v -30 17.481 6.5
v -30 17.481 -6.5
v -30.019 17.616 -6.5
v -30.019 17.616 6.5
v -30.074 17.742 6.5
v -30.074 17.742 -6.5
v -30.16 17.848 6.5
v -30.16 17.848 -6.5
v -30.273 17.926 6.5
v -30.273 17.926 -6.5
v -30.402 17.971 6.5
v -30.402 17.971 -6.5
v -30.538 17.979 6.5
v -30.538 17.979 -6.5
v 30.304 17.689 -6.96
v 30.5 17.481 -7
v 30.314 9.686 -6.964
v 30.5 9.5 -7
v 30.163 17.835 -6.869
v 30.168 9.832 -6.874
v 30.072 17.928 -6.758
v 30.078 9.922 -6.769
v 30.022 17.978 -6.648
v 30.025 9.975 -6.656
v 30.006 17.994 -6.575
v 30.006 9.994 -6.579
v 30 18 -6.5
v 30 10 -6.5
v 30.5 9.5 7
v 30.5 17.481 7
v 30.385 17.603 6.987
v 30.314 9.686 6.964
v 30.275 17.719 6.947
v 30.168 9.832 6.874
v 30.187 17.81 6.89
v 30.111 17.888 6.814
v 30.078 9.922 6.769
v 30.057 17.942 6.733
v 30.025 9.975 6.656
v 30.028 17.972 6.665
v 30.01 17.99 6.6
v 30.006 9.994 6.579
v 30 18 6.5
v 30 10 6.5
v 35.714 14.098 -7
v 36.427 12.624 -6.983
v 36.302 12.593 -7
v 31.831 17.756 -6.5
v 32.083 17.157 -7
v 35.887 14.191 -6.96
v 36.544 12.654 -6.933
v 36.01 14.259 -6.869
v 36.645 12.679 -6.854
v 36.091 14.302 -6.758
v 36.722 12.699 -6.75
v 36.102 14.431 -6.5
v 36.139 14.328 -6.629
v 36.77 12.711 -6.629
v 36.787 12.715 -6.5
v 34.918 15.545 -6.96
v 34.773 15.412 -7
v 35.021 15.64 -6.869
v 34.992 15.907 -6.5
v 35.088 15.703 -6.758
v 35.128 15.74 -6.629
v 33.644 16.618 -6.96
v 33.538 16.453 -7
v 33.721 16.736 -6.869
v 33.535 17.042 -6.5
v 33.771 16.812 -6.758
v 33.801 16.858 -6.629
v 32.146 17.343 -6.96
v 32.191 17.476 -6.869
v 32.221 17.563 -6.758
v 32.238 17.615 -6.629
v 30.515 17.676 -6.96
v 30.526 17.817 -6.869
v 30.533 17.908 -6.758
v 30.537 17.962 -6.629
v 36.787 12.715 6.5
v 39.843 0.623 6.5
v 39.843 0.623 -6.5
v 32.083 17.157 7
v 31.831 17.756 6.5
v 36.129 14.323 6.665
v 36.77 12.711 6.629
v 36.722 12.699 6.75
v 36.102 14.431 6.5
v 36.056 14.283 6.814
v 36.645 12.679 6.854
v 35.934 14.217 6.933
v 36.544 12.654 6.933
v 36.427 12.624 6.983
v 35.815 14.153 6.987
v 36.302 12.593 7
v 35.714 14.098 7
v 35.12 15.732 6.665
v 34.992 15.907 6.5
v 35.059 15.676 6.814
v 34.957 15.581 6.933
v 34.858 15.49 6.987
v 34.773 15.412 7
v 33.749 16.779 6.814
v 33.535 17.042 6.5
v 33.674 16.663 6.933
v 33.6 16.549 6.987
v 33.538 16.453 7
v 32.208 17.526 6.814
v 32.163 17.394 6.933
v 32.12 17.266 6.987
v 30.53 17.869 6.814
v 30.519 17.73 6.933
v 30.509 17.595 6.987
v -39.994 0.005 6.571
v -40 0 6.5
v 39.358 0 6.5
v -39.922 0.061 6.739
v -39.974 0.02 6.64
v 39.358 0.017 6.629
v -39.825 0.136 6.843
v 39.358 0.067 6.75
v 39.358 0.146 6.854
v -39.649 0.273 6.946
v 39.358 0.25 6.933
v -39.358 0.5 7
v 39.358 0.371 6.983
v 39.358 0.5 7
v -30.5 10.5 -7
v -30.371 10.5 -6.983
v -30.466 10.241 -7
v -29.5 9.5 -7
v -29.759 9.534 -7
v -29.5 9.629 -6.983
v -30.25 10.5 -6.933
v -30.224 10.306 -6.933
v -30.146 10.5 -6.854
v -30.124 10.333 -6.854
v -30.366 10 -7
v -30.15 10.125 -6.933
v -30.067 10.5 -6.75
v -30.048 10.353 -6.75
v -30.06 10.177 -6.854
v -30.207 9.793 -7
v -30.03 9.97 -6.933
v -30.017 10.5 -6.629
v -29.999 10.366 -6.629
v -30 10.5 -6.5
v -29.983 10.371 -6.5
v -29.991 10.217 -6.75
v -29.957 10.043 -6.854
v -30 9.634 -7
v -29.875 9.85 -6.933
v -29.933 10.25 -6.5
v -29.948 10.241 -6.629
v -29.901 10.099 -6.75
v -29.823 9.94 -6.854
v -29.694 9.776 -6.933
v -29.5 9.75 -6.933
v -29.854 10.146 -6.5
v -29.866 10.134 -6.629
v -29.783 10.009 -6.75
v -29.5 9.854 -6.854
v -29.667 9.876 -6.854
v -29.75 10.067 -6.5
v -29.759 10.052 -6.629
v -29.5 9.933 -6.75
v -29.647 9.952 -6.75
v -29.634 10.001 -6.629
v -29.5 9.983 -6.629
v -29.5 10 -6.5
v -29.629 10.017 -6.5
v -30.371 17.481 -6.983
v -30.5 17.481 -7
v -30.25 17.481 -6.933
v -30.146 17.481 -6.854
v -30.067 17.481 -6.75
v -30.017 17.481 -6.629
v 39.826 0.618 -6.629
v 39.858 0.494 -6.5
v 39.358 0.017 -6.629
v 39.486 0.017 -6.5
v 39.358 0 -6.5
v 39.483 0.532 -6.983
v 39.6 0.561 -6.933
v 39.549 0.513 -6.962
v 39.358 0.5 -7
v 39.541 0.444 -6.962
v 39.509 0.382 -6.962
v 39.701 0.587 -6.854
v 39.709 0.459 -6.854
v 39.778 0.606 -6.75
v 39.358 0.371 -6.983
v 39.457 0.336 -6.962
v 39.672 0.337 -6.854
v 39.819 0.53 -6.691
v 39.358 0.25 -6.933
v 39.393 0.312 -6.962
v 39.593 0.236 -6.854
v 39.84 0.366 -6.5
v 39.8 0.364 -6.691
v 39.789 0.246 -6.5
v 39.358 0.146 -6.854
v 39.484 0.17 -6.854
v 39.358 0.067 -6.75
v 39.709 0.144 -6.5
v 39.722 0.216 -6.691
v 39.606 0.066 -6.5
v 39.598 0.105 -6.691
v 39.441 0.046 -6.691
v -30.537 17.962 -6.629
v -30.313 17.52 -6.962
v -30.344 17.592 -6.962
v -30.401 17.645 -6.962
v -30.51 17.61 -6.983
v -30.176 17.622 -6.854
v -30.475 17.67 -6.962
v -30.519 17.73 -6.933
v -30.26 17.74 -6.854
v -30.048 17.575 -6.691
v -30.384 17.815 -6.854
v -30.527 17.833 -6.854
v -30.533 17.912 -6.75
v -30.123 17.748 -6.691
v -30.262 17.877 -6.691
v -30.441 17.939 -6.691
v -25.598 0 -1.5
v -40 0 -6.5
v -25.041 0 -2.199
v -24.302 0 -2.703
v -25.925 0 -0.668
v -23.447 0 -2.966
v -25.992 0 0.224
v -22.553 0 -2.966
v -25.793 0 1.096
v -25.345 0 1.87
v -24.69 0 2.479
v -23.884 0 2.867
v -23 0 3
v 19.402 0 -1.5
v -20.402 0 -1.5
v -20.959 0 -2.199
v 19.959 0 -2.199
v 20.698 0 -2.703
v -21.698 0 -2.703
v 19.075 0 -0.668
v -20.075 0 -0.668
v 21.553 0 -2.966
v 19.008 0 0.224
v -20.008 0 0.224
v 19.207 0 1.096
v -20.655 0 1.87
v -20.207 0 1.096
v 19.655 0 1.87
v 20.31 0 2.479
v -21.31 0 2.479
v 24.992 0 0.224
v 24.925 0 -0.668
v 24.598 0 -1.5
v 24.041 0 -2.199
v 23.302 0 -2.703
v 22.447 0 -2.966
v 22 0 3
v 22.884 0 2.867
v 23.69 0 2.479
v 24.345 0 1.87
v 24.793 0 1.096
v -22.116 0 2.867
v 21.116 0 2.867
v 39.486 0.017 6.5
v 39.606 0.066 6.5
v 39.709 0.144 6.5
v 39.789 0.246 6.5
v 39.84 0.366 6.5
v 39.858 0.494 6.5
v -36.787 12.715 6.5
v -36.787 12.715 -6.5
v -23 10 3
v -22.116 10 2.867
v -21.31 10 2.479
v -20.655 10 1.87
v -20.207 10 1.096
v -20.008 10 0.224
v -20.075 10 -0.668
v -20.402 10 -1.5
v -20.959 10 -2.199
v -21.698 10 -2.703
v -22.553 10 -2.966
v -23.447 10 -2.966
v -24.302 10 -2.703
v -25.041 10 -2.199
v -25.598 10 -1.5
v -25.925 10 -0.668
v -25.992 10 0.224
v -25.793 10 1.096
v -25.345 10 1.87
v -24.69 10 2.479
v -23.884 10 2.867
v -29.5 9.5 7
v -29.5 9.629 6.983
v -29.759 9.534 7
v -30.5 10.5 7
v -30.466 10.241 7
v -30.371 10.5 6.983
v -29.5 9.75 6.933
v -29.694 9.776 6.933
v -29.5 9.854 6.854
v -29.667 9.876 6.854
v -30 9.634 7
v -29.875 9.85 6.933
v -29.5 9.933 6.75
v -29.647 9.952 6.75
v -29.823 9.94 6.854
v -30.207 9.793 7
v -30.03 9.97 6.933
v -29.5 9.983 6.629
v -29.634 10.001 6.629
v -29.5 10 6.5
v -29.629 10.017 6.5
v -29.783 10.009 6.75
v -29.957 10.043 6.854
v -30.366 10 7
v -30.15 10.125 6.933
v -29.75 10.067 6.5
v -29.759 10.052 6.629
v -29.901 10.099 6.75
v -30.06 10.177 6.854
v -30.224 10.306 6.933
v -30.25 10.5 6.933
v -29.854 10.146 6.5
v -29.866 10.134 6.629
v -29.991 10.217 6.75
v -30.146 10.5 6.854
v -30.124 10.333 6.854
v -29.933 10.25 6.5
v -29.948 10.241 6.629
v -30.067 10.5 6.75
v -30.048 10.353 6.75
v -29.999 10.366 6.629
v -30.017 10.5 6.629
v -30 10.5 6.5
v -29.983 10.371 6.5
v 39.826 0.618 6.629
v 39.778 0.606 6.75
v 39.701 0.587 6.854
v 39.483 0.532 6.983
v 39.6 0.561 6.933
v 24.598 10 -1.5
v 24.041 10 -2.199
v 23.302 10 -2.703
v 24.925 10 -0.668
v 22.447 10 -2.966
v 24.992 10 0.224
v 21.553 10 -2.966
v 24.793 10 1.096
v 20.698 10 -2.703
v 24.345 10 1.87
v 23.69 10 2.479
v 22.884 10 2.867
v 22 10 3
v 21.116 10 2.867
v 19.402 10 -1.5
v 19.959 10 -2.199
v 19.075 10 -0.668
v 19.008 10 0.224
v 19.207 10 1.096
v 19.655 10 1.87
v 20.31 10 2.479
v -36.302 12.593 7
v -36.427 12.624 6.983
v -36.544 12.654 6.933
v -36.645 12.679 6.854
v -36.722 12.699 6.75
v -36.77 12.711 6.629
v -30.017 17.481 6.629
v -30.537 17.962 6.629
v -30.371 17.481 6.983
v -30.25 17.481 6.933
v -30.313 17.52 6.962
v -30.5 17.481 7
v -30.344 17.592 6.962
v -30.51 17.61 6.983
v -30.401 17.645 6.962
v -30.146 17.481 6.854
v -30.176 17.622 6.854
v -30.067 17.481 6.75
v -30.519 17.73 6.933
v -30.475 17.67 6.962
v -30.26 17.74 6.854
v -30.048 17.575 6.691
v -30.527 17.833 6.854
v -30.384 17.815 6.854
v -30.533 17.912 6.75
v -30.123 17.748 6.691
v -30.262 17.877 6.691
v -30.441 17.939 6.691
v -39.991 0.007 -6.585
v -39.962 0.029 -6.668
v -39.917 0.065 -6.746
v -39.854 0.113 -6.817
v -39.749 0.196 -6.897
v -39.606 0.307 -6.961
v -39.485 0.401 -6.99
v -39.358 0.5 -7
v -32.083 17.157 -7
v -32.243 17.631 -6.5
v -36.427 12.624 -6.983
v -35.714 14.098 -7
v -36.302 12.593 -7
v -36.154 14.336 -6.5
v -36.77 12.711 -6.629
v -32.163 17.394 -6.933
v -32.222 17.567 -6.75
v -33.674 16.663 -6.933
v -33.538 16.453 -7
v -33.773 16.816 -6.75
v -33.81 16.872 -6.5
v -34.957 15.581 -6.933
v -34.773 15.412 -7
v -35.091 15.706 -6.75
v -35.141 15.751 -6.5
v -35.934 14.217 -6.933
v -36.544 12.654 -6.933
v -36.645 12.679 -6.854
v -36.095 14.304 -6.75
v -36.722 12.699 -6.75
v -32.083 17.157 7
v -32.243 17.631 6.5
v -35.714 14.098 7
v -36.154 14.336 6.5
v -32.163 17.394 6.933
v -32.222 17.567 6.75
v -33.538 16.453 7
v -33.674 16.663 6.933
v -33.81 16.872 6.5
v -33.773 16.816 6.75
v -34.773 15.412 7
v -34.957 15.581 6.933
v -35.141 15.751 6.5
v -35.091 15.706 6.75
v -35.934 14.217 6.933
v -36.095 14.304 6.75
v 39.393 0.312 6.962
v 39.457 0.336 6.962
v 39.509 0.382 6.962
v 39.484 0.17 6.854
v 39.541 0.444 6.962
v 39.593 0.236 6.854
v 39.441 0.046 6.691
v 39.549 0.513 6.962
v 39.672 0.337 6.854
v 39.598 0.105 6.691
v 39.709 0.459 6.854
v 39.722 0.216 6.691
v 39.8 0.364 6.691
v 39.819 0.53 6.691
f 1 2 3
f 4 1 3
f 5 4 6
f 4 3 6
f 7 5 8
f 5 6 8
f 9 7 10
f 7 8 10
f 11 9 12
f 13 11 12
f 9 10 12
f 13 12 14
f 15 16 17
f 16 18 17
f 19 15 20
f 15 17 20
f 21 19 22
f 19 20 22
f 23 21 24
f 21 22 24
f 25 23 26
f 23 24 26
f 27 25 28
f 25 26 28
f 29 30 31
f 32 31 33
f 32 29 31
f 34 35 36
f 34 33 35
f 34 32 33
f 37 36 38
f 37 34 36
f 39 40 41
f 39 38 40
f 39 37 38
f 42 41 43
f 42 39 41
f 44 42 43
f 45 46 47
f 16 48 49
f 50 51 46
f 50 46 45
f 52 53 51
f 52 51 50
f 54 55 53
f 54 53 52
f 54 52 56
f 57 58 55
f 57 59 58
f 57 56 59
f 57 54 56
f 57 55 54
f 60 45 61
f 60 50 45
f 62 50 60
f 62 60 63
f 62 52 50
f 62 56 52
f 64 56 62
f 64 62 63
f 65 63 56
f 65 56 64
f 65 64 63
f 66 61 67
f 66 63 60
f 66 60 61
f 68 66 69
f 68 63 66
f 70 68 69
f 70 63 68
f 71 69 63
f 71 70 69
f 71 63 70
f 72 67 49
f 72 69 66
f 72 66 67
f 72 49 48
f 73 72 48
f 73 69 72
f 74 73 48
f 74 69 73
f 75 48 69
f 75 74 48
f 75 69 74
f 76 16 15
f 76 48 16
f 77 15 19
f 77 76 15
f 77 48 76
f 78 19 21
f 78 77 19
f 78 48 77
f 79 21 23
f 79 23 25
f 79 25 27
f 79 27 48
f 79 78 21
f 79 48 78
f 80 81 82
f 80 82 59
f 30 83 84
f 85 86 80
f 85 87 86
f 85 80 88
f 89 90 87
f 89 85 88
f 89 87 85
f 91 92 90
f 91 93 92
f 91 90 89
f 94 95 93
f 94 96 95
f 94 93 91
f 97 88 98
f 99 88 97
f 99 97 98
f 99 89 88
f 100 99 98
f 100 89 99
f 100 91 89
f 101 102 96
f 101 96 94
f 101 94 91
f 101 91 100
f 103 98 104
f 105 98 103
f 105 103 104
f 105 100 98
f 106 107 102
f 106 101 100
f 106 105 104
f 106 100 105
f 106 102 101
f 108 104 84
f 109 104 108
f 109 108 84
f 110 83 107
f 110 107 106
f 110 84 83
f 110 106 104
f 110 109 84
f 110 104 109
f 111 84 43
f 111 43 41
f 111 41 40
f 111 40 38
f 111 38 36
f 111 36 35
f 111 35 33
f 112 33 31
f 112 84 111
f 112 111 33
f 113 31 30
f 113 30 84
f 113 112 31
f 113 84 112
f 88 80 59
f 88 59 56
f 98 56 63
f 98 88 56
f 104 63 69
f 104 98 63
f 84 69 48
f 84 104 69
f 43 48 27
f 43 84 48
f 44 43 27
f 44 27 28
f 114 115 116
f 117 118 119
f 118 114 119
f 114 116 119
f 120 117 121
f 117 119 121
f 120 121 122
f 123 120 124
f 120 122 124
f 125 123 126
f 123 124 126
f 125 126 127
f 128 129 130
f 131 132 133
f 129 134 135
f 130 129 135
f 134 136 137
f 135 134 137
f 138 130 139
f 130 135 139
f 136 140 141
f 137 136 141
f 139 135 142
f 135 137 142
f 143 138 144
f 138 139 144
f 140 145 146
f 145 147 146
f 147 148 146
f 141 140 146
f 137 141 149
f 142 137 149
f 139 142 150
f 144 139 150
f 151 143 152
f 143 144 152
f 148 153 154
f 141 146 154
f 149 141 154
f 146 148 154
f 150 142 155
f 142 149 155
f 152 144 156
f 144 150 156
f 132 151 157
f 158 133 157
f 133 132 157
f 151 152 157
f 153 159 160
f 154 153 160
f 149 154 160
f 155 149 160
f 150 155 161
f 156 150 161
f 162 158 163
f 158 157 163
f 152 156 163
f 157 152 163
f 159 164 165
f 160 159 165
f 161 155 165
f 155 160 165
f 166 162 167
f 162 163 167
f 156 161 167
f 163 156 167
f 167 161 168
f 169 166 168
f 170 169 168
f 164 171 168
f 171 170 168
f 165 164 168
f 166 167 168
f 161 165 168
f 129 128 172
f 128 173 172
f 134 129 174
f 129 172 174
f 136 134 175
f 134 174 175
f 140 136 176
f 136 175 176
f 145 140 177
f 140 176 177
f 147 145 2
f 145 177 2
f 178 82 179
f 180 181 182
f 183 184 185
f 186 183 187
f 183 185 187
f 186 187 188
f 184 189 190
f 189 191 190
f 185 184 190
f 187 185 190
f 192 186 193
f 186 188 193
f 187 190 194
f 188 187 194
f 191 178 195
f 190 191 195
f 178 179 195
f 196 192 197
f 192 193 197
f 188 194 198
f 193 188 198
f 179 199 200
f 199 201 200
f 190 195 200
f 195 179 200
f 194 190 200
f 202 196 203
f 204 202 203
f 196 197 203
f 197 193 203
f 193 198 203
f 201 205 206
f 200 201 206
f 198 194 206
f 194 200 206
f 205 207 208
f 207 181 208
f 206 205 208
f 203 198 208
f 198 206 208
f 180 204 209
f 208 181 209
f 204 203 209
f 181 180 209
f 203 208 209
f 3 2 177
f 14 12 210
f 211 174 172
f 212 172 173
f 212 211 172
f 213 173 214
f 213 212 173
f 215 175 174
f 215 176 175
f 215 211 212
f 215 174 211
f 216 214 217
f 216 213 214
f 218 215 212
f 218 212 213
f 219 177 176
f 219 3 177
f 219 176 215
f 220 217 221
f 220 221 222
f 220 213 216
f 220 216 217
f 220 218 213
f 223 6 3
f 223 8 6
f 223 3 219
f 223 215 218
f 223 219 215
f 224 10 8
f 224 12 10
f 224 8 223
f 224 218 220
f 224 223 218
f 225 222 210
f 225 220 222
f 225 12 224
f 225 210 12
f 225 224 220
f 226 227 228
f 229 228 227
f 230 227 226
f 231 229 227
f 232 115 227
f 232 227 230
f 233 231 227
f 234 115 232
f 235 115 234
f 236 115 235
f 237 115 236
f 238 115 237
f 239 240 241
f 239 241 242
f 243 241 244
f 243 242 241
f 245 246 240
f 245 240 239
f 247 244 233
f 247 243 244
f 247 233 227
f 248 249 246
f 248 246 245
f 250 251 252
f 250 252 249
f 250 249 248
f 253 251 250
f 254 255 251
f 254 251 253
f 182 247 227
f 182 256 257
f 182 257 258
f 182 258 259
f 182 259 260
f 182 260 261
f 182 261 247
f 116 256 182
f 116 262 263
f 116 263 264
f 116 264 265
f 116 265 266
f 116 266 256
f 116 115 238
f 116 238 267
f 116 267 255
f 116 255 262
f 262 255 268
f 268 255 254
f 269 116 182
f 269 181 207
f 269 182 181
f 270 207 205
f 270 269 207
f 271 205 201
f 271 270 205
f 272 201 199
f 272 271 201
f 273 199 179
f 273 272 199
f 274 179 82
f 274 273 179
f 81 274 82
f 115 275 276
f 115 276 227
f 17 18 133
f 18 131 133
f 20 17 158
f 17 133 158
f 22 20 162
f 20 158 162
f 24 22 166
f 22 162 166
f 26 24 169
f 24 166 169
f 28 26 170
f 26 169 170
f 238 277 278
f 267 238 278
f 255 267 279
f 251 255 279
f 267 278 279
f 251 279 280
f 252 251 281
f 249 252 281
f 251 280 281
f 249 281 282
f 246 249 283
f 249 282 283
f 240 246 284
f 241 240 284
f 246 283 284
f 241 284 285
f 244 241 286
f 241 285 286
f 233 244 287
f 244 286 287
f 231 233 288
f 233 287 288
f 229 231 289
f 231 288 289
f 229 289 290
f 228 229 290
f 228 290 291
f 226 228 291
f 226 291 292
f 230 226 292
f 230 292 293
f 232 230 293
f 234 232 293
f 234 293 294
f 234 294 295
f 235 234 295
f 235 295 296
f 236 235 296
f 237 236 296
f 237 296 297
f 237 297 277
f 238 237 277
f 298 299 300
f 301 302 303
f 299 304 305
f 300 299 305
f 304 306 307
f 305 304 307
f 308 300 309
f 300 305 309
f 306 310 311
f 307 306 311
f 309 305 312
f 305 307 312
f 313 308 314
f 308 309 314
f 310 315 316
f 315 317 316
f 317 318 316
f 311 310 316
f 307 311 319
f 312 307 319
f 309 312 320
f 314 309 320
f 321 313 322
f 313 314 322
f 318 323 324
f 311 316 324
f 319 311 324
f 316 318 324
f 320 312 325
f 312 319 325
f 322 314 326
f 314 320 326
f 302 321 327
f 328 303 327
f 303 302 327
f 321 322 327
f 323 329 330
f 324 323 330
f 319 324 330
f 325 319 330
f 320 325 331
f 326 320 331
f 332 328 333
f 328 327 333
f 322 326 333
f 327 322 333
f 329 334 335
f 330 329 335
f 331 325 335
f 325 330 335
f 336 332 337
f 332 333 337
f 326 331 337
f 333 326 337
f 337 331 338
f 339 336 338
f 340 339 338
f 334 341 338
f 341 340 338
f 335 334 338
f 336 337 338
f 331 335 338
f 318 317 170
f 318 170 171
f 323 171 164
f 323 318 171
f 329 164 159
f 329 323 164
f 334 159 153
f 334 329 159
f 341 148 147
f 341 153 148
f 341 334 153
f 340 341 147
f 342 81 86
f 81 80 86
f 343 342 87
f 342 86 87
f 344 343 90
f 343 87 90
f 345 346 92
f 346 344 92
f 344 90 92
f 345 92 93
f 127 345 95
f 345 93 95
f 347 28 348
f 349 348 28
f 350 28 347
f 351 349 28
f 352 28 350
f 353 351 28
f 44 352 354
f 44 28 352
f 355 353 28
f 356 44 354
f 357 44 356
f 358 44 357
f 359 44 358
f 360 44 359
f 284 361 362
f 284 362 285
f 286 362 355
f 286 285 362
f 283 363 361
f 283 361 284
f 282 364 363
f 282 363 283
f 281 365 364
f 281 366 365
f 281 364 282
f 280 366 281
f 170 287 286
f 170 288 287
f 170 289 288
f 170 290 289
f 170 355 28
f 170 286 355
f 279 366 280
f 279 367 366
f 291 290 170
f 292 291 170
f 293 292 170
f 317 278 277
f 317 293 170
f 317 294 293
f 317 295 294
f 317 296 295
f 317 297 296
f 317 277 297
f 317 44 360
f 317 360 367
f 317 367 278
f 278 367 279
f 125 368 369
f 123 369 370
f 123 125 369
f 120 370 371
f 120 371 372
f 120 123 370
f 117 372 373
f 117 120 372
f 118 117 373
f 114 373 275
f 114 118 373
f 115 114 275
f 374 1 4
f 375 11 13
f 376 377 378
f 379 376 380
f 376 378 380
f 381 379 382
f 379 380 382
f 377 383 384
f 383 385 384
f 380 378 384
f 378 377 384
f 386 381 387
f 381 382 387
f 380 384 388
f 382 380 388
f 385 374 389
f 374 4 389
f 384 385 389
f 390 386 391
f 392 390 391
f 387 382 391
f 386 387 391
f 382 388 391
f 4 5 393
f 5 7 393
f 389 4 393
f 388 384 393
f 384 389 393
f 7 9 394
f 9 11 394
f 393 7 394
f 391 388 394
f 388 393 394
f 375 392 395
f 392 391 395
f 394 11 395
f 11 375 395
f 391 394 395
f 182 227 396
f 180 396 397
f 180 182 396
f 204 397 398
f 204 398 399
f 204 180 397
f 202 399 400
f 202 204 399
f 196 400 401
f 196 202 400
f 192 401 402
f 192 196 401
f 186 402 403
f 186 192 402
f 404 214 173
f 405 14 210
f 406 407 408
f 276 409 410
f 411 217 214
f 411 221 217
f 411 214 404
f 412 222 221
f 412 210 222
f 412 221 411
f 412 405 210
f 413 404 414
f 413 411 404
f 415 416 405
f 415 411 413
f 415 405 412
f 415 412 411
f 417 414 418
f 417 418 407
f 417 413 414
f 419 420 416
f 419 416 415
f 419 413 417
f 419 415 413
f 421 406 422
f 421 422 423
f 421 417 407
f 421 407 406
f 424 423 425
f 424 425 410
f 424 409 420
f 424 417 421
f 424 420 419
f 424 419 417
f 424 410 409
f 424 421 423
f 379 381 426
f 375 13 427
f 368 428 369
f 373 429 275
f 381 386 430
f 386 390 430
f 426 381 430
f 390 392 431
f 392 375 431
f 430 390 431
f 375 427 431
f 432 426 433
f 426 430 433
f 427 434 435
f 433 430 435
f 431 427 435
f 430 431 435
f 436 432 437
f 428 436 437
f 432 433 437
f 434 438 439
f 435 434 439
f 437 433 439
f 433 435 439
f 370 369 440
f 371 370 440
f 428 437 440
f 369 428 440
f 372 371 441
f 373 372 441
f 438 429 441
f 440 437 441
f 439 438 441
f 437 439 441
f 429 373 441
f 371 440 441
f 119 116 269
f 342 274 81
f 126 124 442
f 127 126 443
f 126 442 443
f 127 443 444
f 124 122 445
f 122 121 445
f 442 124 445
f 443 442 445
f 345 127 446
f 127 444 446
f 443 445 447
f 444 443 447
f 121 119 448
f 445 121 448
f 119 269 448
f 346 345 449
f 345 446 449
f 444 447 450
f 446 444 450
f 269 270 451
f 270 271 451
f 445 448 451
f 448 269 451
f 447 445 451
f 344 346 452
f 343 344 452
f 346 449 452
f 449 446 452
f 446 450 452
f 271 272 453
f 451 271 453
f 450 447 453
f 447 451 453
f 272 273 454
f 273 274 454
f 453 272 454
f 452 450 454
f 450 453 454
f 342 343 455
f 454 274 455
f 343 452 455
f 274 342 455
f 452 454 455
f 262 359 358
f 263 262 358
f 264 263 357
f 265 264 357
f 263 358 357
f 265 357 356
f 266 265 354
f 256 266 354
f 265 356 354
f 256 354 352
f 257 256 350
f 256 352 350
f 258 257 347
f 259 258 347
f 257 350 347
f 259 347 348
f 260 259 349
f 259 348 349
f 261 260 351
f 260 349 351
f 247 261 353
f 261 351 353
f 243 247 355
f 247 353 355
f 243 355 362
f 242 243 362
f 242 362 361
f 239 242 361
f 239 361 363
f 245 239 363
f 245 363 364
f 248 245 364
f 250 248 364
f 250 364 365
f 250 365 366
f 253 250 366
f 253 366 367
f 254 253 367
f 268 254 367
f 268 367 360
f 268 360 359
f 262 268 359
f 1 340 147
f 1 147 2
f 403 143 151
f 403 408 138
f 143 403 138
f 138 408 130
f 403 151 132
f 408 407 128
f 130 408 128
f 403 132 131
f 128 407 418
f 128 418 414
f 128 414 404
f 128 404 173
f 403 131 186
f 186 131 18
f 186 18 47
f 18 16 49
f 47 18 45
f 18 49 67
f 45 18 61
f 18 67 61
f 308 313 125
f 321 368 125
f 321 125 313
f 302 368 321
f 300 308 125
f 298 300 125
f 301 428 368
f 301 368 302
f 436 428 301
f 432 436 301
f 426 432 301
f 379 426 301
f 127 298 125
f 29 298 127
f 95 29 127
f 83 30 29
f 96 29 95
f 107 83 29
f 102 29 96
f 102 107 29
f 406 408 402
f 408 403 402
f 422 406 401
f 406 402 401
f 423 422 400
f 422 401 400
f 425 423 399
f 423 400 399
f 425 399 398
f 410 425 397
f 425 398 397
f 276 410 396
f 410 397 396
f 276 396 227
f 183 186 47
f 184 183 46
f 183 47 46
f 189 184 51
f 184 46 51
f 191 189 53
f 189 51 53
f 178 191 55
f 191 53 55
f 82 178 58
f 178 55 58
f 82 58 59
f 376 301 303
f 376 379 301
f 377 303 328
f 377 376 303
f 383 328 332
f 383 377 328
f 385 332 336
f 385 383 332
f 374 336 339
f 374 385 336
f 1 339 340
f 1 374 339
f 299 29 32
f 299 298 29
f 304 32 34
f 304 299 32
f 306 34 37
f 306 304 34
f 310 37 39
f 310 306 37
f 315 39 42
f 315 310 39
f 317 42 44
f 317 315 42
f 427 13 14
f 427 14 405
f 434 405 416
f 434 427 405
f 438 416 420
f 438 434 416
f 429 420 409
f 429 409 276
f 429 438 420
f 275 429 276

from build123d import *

# Parameters (mm, degrees)
BOSS_EXTRUDE1_DEPTH = 7
SKETCH2_R           = 3
CUT_EXTRUDE1_DEPTH  = 14
FILLET1_R           = 0.5


with BuildPart() as part:
    # Sketch1 → Boss-Extrude1 (new, symmetric)
    with BuildSketch(Plane.XY):
        with BuildLine():
            Line((-40, 0), (40, 0))
            Line((40, 0), (36.78663137, 12.715119427))
            ThreePointArc((36.78663137, 12.715119427), (34.30082341, 16.522944685), (30, 18))
            Line((30, 18), (30, 10))
            Line((30, 10), (-30, 10))
            Line((-30, 10), (-30, 18))
            ThreePointArc((-30, 18), (-34.30082341, 16.522944685), (-36.78663137, 12.715119427))
            Line((-36.78663137, 12.715119427), (-40, 0))
        make_face()
    extrude(amount=BOSS_EXTRUDE1_DEPTH, both=True)

    # Sketch2 → Cut-Extrude1 (cut)
    with BuildSketch(Plane(origin=(0, 10, 0), x_dir=(1, 0, 0), z_dir=(0, 1, 0))):
        with Locations(Location((-23, 0, 0), (0, 0, 270))):
            Circle(SKETCH2_R)
        with Locations(Location((22, 0, 0), (0, 0, 270))):
            Circle(SKETCH2_R)
    extrude(amount=-CUT_EXTRUDE1_DEPTH, mode=Mode.SUBTRACT)

    # Fillet1
    fillet1_edges = [part.edges().sort_by_distance(p)[0] for p in [
        (34.30082341, 16.522944685, -7),
        (38.393315685, 6.357559714, -7),
        (0, 0, -7),
        (-38.393315685, 6.357559714, -7),
        (38.393315685, 6.357559714, 7),
        (-30, 18, 0),
        (-30, 10, 0),
        (40, 0, 0),
        (34.30082341, 16.522944685, 7),
        (30, 14, 7),
        (0, 10, 7),
        (-30, 14, 7),
        (-34.30082341, 16.522944685, 7),
        (-38.393315685, 6.357559714, 7),
        (-34.30082341, 16.522944685, -7),
        (0, 0, 7),
        (-30, 14, -7),
        (0, 10, -7),
        (30, 14, -7),
    ]]
    fillet(fillet1_edges, radius=FILLET1_R)


solid = part.part
